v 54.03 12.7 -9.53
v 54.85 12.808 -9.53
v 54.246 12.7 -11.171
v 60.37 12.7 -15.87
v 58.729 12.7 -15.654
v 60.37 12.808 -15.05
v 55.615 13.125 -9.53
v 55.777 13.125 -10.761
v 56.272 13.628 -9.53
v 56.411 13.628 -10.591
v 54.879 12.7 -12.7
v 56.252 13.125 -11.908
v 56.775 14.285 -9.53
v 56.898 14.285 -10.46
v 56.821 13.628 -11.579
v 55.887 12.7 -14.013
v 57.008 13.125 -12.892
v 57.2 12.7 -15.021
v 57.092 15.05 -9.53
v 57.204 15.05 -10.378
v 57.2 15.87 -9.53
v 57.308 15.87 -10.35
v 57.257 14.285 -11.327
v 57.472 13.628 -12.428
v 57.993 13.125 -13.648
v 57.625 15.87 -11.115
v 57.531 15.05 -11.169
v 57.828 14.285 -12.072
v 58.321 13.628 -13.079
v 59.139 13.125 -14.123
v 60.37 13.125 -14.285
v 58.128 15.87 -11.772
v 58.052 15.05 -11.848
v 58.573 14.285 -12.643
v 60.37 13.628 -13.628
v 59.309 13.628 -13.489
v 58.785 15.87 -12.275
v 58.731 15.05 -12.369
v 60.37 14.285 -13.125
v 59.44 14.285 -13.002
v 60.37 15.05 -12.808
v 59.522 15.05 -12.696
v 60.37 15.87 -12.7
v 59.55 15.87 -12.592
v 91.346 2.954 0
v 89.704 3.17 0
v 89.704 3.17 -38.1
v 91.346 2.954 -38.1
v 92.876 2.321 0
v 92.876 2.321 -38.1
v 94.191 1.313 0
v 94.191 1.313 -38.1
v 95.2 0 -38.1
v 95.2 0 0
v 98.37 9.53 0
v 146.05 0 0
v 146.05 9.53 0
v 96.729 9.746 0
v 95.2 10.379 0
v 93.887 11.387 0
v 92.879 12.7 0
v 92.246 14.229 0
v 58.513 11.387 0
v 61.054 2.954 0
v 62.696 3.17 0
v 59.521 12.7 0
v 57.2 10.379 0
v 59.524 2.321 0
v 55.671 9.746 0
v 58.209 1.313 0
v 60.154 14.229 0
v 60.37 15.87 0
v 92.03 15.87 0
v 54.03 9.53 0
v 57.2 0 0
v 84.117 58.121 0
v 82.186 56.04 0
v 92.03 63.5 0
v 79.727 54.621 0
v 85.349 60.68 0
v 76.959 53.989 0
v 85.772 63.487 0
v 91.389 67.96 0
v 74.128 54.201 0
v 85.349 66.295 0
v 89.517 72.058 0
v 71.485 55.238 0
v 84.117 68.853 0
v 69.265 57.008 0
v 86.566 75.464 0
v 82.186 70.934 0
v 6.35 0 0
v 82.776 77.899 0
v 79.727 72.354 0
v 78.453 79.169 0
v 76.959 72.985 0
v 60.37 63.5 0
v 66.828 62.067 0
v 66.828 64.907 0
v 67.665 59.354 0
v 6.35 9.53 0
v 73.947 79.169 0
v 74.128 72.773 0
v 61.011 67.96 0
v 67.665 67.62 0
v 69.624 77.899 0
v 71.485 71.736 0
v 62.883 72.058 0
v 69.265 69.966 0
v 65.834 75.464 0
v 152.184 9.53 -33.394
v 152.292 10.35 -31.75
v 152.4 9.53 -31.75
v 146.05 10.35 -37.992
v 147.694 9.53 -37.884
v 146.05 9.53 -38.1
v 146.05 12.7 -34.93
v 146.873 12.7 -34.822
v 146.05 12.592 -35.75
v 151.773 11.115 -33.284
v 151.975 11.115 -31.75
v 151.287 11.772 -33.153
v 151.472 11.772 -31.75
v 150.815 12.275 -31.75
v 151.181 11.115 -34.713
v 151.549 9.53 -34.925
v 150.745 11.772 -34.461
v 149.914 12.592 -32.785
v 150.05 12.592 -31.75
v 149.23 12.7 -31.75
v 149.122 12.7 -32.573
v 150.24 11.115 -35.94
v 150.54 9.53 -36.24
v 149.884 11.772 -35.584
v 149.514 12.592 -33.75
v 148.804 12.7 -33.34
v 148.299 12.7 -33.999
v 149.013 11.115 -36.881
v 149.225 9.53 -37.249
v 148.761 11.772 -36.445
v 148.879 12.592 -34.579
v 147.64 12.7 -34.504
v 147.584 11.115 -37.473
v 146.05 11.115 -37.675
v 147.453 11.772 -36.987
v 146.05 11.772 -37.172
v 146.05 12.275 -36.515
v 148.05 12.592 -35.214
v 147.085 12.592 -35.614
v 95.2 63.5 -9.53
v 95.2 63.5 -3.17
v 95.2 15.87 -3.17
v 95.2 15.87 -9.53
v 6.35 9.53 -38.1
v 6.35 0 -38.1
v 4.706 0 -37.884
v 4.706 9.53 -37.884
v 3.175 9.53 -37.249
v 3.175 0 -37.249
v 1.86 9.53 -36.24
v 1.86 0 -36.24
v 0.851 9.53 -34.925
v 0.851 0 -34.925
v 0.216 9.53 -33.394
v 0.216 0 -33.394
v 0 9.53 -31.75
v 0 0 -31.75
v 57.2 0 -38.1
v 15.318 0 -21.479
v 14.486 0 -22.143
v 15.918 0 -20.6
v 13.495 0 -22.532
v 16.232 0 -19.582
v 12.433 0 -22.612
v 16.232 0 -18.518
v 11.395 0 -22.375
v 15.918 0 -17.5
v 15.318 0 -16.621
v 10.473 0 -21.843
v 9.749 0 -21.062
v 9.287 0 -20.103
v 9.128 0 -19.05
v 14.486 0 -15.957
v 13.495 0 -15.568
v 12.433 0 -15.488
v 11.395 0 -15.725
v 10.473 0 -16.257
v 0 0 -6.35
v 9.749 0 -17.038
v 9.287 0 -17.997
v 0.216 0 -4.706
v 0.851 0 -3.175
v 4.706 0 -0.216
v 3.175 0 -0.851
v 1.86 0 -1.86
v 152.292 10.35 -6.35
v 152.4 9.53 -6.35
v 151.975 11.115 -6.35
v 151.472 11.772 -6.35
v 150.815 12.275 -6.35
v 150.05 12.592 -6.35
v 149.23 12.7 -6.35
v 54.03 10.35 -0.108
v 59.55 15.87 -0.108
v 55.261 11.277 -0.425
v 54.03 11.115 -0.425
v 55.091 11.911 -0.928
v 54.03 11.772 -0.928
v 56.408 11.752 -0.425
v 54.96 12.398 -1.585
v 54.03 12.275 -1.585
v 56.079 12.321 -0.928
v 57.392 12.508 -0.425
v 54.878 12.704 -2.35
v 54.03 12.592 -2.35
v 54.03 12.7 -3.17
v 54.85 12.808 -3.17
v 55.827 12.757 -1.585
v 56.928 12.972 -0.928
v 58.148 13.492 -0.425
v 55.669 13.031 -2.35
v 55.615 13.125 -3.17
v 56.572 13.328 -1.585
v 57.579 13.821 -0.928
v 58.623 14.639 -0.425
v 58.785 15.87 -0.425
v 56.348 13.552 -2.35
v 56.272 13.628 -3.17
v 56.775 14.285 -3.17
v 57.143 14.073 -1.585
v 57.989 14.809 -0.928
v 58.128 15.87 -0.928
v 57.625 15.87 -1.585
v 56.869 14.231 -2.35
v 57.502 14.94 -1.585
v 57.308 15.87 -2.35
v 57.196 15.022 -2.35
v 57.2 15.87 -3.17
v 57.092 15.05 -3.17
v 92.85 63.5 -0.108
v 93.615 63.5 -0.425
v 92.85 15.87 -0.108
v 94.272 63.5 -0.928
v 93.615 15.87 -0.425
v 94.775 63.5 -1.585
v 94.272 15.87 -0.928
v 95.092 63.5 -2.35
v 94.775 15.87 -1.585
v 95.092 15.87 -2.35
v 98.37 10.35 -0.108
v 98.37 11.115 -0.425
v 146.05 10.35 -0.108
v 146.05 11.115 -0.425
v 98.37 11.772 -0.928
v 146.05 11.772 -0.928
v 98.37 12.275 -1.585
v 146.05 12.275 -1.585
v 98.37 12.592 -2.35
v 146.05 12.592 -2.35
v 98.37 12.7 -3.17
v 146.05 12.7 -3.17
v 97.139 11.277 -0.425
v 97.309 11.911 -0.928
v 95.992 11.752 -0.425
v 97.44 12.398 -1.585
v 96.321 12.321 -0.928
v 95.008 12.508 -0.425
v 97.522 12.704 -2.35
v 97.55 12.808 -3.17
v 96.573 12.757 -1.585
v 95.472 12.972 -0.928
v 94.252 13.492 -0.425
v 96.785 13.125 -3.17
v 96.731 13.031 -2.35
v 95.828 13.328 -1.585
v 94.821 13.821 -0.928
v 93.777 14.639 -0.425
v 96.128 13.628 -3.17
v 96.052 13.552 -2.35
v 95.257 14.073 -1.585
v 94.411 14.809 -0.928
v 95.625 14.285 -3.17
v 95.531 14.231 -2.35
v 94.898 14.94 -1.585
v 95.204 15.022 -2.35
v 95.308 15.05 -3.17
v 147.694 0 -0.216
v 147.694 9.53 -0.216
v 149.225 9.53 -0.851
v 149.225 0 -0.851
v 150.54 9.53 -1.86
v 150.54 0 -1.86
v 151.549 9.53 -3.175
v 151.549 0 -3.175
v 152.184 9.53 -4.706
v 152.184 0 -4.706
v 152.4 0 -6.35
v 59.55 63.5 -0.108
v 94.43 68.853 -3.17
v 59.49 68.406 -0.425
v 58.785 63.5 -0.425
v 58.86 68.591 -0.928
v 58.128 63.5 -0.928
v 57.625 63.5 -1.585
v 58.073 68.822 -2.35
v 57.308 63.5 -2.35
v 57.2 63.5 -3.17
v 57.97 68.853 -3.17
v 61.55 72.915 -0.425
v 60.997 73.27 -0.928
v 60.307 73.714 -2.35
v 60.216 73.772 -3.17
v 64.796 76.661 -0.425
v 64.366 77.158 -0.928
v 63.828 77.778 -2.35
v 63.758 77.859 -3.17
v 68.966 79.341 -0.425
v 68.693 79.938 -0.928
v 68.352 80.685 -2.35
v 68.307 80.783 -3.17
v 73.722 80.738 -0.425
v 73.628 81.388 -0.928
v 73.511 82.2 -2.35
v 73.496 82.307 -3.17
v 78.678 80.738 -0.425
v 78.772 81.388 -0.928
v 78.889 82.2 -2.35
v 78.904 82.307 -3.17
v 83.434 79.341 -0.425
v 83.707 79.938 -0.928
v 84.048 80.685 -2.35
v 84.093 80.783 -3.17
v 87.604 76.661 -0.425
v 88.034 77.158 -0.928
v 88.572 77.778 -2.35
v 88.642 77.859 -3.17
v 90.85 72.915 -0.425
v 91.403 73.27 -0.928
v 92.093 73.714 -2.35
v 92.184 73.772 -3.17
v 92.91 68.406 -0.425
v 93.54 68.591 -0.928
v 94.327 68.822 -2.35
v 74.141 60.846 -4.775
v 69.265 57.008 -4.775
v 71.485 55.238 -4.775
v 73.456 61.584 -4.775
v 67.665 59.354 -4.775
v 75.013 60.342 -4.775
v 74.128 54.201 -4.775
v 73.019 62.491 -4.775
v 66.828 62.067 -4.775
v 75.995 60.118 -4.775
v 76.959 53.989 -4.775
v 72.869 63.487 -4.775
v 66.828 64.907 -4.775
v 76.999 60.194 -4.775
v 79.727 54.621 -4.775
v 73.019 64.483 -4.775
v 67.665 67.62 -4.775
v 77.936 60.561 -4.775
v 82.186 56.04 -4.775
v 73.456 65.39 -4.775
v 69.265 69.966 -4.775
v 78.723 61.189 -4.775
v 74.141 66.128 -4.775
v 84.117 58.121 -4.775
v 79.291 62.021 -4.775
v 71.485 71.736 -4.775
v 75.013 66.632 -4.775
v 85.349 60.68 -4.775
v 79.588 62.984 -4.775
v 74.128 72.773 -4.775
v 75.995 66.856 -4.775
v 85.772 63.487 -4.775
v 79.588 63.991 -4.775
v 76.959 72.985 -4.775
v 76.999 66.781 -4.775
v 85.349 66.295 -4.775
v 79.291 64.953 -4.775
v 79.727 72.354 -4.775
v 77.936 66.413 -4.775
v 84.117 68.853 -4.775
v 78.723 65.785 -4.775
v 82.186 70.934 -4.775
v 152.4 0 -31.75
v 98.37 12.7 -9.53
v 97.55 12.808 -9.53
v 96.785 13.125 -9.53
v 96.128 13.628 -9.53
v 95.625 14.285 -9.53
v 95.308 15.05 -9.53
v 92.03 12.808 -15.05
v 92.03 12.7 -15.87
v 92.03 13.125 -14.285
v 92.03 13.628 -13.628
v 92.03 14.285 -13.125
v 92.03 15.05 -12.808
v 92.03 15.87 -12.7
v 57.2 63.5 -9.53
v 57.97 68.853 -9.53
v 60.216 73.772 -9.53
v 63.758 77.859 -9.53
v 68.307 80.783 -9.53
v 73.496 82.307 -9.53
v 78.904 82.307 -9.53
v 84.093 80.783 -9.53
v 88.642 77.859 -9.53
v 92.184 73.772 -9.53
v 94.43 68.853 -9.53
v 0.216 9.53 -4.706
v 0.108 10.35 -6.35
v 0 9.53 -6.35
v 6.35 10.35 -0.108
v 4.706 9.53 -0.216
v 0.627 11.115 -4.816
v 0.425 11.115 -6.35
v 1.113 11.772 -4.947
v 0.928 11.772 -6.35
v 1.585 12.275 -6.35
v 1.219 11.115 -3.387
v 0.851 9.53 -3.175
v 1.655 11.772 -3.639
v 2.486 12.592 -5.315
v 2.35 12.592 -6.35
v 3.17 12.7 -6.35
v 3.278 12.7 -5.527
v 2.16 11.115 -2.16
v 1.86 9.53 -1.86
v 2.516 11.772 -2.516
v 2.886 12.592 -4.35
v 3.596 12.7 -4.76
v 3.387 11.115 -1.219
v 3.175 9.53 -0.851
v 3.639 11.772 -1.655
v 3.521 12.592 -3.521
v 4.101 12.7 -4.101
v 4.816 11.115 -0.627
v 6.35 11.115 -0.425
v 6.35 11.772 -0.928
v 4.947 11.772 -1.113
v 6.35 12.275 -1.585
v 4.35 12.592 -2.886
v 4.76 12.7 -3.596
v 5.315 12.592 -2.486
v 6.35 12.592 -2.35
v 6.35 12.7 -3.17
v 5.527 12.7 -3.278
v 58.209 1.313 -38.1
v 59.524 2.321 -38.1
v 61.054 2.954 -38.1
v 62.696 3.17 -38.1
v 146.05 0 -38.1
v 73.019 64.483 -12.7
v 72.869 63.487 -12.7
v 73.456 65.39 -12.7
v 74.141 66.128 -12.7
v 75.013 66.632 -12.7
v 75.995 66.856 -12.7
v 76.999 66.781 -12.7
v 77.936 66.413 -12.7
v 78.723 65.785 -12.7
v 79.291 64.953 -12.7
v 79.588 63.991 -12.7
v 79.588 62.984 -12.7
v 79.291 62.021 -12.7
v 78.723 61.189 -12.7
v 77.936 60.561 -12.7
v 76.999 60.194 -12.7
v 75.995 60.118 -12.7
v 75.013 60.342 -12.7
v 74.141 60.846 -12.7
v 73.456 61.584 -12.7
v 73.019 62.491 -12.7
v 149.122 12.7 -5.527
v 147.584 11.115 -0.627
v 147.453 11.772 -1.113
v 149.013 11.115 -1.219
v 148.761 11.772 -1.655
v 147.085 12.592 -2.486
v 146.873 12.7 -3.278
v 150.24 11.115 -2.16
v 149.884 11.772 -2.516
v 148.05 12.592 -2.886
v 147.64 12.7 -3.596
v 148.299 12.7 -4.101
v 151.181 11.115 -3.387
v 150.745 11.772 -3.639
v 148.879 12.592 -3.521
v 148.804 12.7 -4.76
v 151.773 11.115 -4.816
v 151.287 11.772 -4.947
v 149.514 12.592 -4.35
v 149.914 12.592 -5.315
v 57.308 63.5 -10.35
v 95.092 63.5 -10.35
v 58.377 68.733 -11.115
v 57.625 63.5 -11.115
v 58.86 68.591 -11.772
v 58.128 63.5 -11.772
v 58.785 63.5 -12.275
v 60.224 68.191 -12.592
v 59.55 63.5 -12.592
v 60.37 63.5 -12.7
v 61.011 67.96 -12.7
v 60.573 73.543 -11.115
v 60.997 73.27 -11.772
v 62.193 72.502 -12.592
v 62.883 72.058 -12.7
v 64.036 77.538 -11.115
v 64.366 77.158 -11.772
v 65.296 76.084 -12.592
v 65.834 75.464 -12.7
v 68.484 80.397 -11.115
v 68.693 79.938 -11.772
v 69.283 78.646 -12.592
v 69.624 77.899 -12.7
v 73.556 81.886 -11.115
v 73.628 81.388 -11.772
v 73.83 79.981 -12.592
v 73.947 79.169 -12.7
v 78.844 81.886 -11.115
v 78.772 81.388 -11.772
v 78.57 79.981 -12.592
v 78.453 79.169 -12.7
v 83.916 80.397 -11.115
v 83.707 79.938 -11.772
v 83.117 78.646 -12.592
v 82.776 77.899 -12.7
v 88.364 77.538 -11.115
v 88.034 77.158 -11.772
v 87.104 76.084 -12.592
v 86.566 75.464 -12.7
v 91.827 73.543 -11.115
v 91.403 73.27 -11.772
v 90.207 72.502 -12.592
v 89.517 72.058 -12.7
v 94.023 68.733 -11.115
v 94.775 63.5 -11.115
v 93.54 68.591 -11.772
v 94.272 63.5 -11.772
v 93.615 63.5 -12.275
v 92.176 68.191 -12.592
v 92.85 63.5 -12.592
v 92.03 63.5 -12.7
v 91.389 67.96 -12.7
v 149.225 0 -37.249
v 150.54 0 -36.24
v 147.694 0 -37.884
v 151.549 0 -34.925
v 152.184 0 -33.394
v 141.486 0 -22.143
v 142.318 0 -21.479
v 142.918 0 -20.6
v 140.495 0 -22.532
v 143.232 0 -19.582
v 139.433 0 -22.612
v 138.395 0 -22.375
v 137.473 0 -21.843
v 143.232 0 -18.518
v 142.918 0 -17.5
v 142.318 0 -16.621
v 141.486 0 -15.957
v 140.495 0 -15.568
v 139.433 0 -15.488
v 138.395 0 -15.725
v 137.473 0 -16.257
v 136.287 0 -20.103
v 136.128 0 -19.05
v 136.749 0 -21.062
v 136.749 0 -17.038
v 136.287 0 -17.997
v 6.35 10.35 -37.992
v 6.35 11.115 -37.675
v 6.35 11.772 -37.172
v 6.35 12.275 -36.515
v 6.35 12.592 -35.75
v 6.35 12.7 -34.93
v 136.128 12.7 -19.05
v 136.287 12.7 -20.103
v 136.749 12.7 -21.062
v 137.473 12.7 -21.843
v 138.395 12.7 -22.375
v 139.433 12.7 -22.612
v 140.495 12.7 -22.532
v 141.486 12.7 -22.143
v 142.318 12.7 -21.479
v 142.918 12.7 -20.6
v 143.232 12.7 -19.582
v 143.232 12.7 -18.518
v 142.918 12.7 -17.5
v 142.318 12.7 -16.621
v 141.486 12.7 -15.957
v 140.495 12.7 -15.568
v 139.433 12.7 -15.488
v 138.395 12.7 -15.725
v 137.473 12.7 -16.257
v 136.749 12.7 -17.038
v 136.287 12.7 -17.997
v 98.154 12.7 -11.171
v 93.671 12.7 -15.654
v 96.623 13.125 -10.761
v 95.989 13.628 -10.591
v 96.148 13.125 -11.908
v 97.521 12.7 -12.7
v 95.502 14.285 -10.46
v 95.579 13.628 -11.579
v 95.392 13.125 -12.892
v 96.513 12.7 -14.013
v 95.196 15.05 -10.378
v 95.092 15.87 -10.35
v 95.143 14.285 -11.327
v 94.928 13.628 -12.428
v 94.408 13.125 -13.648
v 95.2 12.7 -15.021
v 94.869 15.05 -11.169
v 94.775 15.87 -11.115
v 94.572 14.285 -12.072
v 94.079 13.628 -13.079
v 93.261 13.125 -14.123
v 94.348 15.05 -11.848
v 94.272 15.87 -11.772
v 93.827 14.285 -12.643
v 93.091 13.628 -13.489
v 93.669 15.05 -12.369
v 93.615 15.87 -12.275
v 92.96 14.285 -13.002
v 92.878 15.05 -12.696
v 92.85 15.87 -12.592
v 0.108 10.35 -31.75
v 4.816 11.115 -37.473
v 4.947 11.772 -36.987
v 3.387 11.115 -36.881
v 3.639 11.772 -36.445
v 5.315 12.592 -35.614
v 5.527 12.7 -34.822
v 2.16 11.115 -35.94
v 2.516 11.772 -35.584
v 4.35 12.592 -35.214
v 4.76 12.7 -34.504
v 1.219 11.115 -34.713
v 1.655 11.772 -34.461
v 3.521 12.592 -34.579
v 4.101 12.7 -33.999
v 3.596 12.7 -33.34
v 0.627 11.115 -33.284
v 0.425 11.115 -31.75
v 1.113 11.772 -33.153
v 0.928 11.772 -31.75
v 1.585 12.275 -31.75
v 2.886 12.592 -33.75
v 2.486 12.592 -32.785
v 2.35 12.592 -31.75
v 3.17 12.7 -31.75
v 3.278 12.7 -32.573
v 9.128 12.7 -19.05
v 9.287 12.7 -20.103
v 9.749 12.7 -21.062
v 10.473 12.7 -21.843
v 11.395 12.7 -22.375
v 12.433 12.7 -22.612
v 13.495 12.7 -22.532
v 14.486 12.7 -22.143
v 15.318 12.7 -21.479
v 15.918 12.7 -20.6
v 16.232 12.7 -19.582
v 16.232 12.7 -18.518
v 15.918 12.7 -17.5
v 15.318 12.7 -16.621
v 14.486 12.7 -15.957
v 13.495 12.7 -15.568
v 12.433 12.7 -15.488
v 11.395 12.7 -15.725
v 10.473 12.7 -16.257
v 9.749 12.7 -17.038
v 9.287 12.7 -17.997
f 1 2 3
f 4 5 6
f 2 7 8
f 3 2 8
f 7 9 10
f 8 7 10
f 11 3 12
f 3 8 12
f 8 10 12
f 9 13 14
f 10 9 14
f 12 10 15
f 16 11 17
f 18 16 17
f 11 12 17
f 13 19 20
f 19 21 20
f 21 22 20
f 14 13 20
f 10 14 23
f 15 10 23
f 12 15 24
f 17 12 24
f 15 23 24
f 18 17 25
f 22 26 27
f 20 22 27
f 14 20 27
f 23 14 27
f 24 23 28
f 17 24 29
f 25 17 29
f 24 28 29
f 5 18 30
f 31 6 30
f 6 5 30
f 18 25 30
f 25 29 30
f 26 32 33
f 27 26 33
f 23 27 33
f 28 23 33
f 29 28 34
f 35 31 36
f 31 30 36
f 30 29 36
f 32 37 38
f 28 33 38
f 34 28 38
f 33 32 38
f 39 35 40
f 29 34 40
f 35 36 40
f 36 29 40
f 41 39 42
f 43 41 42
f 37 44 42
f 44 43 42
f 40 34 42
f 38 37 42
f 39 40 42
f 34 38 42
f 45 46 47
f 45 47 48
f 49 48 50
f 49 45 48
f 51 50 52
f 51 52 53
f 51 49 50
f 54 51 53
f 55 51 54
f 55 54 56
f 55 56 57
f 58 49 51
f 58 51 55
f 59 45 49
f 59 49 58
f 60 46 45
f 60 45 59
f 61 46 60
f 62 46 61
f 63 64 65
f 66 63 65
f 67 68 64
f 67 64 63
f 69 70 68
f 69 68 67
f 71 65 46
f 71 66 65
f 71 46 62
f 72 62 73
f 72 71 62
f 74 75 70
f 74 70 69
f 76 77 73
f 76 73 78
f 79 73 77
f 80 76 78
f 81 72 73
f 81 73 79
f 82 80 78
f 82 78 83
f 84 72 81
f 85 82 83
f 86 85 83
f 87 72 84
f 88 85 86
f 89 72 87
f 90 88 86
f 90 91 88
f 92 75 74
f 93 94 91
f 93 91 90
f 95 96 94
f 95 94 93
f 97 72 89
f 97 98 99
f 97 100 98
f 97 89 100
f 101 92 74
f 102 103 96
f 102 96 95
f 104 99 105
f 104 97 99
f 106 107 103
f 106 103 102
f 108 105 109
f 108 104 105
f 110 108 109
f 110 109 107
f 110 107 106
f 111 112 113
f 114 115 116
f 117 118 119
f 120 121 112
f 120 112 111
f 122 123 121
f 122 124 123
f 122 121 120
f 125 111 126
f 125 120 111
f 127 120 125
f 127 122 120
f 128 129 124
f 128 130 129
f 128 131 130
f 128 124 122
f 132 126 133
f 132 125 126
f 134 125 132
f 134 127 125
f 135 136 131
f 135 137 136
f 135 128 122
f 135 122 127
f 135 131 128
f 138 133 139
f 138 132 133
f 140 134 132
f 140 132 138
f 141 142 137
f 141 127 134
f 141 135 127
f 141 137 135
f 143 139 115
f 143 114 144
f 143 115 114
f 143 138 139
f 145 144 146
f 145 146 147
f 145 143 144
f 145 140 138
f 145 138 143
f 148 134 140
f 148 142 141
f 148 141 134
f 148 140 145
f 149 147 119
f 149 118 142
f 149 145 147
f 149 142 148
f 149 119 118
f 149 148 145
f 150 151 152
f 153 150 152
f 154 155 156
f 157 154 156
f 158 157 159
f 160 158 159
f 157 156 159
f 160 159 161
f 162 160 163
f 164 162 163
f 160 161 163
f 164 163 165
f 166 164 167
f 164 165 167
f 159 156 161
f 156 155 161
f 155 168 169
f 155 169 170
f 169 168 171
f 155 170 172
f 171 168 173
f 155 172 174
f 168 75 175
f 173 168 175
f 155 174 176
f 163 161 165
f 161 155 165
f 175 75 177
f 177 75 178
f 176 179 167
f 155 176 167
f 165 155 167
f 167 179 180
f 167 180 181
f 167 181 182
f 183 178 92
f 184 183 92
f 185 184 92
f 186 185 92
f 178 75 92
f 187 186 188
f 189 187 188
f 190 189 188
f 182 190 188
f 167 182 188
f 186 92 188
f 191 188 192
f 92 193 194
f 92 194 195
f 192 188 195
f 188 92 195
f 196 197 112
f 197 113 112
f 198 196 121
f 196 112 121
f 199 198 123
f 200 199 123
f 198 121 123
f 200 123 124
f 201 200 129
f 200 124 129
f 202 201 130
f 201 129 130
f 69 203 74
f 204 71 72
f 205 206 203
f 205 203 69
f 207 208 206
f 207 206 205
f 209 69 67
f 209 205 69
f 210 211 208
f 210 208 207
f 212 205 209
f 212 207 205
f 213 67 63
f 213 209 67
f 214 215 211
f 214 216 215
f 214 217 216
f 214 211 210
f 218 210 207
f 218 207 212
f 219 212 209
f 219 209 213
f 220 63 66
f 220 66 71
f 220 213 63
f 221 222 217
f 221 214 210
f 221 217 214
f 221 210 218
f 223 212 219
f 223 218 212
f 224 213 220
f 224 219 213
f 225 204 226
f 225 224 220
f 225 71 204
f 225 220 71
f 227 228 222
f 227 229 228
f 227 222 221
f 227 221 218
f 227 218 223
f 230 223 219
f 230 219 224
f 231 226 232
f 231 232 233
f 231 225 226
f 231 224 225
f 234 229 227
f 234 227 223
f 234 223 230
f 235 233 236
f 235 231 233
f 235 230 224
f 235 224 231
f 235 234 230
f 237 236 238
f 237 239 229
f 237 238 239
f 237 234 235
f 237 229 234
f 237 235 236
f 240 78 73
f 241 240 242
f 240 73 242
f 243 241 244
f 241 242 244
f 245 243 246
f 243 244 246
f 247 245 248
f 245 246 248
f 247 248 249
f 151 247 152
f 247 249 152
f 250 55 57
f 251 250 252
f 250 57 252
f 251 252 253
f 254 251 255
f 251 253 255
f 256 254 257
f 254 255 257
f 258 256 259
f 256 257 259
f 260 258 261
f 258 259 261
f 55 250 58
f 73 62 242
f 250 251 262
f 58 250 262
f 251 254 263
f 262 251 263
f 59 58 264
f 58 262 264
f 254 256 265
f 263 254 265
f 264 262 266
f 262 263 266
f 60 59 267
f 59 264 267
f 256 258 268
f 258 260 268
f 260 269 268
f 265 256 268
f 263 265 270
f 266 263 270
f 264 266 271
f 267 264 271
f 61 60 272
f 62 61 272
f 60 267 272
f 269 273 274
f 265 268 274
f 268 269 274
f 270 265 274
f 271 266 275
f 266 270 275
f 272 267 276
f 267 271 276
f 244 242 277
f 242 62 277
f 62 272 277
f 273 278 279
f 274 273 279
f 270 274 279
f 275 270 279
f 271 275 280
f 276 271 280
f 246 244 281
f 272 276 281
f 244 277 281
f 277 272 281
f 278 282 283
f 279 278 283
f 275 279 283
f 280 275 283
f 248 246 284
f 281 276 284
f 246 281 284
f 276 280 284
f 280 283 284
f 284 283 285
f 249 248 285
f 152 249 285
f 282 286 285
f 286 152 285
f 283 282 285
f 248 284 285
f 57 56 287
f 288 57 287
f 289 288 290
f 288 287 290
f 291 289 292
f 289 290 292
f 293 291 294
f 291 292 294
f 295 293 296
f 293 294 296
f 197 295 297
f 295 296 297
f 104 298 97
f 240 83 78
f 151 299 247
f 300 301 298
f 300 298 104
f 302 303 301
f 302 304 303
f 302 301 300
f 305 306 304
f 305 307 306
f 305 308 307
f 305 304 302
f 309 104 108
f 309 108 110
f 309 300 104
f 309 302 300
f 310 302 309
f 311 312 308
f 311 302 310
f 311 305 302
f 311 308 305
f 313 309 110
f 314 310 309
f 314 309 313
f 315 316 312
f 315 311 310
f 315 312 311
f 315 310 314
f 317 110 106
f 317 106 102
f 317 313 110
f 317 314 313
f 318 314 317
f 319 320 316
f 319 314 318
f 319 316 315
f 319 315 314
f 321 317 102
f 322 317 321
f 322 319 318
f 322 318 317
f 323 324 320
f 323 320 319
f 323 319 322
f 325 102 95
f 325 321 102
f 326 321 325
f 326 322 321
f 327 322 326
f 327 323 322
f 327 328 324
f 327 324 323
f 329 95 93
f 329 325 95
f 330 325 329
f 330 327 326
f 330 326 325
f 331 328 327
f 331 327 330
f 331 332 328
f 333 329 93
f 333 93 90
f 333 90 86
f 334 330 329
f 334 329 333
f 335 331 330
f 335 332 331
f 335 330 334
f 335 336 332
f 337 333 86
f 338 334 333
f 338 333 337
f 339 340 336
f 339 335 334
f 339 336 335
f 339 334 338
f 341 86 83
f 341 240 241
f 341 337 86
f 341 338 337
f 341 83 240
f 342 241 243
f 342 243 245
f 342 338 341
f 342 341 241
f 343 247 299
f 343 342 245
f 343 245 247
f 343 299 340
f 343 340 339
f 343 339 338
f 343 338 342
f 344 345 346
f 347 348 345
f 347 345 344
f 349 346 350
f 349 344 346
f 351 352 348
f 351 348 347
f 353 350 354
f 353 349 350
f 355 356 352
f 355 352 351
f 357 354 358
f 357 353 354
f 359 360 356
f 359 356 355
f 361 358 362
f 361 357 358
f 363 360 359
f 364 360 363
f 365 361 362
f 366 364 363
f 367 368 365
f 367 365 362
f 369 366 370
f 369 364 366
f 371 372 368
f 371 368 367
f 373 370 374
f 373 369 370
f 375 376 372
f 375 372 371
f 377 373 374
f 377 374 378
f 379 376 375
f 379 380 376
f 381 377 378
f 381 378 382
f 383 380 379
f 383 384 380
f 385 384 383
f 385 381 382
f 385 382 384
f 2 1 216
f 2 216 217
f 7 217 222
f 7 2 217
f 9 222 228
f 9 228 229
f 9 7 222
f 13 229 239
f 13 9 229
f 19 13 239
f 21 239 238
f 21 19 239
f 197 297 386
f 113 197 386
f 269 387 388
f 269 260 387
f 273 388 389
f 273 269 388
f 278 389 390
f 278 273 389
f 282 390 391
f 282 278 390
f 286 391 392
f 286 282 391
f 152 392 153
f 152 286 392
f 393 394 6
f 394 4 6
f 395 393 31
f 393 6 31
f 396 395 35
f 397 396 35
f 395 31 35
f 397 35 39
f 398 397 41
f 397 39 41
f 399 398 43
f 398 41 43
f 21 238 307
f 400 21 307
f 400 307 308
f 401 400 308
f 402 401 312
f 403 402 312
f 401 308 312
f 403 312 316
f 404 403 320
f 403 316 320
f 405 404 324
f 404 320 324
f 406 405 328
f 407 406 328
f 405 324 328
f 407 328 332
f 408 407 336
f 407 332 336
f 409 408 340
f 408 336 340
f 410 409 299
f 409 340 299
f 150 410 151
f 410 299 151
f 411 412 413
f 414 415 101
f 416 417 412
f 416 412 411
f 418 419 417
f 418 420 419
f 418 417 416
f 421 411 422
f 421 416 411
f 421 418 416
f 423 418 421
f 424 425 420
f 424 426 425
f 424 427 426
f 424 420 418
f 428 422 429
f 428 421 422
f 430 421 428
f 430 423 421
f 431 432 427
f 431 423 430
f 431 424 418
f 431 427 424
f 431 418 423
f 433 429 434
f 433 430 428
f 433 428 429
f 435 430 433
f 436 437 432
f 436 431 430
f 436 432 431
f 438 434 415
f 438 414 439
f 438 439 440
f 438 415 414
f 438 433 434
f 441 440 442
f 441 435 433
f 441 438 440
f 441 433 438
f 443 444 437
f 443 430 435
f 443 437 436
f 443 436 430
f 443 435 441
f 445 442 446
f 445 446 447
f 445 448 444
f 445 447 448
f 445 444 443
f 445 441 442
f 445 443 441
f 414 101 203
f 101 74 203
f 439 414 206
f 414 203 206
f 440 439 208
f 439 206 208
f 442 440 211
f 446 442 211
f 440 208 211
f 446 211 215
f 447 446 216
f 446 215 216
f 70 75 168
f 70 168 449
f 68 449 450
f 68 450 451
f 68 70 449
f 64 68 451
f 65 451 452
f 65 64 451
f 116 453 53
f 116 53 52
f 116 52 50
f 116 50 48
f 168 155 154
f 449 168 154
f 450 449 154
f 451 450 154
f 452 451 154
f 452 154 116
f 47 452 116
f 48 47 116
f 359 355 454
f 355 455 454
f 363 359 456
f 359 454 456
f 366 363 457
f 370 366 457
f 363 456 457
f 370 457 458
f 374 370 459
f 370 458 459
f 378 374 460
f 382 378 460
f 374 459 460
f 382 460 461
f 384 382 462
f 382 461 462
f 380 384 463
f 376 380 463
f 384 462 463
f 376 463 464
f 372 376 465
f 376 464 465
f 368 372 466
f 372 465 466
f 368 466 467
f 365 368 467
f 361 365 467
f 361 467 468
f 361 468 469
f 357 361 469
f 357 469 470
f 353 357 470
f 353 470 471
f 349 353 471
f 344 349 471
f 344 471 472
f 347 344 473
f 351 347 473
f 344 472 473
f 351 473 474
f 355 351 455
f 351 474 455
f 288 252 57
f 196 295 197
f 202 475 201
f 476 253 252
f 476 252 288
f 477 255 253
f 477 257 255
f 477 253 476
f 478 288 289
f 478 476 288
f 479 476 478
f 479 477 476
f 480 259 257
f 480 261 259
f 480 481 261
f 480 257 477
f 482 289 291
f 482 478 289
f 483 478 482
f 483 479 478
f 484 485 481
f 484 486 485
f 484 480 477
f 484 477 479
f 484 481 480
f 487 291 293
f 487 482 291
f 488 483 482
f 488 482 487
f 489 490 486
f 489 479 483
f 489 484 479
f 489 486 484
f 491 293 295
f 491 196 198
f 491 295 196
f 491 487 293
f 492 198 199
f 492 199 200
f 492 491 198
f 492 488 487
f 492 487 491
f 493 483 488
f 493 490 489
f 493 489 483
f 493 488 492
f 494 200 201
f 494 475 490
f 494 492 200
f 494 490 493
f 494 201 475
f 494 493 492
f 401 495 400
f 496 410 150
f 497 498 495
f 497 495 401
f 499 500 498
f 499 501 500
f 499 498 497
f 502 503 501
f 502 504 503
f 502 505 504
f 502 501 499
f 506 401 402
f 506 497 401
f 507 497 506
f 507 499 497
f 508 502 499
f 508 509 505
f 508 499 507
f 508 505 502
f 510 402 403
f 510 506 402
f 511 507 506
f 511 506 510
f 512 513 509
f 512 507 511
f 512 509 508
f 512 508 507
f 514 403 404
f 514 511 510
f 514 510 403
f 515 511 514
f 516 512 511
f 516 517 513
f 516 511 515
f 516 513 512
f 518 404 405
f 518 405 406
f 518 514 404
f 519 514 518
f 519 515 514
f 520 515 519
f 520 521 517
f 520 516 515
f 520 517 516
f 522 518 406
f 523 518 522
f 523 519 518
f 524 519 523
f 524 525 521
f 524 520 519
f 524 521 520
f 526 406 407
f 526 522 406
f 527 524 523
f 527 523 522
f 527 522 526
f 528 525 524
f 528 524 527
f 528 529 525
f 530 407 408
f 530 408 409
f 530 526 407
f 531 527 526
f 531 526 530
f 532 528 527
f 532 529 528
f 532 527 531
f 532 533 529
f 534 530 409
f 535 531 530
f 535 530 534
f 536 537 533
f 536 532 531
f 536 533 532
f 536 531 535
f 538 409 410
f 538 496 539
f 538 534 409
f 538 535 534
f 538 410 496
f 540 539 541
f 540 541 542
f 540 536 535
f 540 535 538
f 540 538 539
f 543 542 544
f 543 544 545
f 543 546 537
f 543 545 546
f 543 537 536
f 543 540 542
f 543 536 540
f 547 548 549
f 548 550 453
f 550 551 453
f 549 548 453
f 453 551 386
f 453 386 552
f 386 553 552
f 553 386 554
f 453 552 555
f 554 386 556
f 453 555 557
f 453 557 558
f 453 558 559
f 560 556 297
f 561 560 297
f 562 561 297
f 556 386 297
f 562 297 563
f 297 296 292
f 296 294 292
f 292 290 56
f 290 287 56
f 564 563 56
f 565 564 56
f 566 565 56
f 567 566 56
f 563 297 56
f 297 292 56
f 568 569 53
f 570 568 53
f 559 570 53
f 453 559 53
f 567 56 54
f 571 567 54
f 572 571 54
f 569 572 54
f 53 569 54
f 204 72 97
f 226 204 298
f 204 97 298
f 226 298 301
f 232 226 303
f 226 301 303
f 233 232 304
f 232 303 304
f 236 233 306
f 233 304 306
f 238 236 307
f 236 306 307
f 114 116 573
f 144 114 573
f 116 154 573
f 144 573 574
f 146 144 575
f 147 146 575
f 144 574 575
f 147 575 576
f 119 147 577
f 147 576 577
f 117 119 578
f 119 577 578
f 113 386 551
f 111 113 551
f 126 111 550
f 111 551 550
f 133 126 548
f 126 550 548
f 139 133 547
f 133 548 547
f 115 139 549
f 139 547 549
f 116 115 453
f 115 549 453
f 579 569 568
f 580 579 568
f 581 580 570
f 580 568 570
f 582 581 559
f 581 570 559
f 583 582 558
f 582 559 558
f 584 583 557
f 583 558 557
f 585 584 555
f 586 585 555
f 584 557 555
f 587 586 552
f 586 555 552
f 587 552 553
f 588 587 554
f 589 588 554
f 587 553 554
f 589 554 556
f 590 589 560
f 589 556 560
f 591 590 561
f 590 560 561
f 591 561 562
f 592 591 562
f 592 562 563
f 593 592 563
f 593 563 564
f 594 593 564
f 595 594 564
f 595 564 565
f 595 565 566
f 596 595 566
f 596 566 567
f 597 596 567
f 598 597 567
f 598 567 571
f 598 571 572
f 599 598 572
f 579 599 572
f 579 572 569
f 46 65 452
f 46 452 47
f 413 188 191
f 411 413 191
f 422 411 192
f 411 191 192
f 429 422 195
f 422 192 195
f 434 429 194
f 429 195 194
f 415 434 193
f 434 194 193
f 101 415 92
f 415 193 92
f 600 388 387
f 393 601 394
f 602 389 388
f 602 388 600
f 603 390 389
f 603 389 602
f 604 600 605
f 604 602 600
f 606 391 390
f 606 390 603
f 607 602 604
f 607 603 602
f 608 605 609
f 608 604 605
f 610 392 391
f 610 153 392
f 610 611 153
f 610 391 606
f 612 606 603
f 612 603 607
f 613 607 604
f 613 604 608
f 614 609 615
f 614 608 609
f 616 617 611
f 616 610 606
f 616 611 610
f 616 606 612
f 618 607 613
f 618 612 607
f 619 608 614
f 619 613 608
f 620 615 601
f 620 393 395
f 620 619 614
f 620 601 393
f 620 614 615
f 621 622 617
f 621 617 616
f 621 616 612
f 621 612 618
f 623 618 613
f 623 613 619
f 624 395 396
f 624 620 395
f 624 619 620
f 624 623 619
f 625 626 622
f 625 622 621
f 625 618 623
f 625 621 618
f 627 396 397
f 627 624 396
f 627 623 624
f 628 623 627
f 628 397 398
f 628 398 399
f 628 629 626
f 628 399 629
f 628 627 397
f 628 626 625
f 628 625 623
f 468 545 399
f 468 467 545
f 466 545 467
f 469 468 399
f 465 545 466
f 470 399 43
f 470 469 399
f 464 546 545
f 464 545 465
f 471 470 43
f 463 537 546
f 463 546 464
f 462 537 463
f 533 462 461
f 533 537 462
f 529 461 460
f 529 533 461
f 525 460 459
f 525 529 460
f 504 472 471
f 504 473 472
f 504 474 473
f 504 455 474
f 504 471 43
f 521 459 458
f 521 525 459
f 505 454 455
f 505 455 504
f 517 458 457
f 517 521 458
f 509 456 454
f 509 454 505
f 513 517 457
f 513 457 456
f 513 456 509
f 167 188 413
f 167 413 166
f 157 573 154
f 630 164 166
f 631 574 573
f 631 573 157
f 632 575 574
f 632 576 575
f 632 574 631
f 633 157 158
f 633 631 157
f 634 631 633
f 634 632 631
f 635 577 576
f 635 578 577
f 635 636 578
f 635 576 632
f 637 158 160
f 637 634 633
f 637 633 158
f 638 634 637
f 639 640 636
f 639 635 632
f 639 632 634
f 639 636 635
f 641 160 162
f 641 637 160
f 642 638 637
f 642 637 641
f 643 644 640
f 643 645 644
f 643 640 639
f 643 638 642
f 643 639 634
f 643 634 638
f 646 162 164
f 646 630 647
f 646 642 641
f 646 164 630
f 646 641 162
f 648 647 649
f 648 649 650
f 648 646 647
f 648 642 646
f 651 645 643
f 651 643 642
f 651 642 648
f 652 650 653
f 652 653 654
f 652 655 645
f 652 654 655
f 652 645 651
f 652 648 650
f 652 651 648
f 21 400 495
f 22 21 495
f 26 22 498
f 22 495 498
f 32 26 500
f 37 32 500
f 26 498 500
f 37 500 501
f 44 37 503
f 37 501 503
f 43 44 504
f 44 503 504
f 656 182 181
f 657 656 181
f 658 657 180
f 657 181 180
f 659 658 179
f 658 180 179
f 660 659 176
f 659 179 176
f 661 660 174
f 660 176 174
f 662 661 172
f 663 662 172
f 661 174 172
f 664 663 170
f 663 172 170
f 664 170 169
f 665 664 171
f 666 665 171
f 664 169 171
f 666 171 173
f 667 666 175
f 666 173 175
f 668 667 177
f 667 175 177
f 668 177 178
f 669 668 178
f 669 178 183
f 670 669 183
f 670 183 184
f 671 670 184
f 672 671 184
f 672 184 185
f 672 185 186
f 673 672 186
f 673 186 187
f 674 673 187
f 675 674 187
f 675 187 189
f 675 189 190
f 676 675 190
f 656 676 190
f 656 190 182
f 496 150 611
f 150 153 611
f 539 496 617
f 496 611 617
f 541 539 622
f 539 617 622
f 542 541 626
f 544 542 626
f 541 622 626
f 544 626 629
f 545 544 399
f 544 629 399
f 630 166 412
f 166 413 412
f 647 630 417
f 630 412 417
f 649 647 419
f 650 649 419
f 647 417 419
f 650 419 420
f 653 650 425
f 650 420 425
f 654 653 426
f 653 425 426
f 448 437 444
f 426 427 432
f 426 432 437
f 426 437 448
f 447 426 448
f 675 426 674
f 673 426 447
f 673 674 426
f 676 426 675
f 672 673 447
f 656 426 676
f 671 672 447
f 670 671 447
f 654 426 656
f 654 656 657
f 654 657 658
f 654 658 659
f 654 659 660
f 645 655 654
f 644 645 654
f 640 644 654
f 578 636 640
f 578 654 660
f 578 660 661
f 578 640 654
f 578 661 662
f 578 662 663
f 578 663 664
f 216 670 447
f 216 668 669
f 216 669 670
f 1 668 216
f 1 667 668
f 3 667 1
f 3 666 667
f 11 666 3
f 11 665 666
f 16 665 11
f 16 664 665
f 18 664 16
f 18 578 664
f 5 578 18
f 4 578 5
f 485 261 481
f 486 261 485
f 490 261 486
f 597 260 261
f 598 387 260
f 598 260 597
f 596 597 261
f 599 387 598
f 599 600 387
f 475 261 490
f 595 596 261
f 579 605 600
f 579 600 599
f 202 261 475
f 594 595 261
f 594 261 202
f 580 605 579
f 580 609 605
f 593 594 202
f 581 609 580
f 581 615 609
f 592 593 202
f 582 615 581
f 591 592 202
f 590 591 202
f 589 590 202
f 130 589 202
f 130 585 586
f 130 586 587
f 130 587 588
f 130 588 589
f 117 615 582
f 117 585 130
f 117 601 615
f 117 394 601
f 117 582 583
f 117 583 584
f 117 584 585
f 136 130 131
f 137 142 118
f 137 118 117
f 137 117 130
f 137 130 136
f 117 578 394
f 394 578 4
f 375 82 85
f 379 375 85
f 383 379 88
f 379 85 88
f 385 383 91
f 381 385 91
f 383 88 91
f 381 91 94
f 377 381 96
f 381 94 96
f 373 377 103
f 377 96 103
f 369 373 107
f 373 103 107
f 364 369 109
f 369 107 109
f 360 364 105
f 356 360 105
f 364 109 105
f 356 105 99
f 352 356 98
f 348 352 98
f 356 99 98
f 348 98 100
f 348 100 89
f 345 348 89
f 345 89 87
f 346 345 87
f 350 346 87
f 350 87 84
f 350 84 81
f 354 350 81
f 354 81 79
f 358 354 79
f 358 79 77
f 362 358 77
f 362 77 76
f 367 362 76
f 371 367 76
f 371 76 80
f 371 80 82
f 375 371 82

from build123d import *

# Parameters (mm, degrees)
SKETCH1_W                                = 152.4
SKETCH1_H                                = 38.1
BASEPLATE_DEPTH                          = 12.7
VERTBOSS_DEPTH                           = 12.7
F_9_32_0_28125_DIAMETER_HOLE1_D          = 7.14375
CBORE_FOR_1_4_HEX_HEAD_BOLT1_D           = 6.7564
CBORE_FOR_1_4_HEX_HEAD_BOLT1_CBORE_D     = 19.05
CBORE_FOR_1_4_HEX_HEAD_BOLT1_CBORE_DEPTH = 4.7752
SKETCH11_W                               = 38
SKETCH11_H                               = 3.17
BOTTOMSLOT_DEPTH                         = 178.43624207
FILLET1_R                                = 6.35
FILLET2_R                                = 3.17


with BuildPart() as part:
    # Sketch1 → BasePlate (new body)
    with BuildSketch(Plane(origin=(0, 0, 0), x_dir=(1, 0, 0), z_dir=(0, 1, 0))):
        with Locations((76.2, 19.05)):
            Rectangle(SKETCH1_W, SKETCH1_H)
    extrude(amount=BASEPLATE_DEPTH)

    # Sketch3 → VertBoss (add)
    with BuildSketch(Plane.XY):
        with BuildLine():
            Line((57.2, 0), (57.2, 63.5))
            ThreePointArc((57.2, 63.5), (76.2, 82.5), (95.2, 63.5))
            Line((95.2, 63.5), (95.2, 0))
            Line((95.2, 0), (57.2, 0))
        make_face()
    extrude(amount=-VERTBOSS_DEPTH)

    # 9/32 (0.28125) Diameter Hole1 (through all)
    with Locations(Plane(origin=(0, 12.7, 0), x_dir=(1, 0, 0), z_dir=(0, 1, 0))):
        with Locations((139.7, 19.05), (12.7, 19.05)):
            Hole(F_9_32_0_28125_DIAMETER_HOLE1_D / 2)

    # CBORE for 1/4 Hex Head Bolt1 (through all)
    with Locations(Plane.XY):
        with Locations((76.24706856, 63.487087048)):
            CounterBoreHole(CBORE_FOR_1_4_HEX_HEAD_BOLT1_D / 2, CBORE_FOR_1_4_HEX_HEAD_BOLT1_CBORE_D / 2, CBORE_FOR_1_4_HEX_HEAD_BOLT1_CBORE_DEPTH)

    # Sketch11 → BottomSlot (cut, through all)
    with BuildSketch(Plane.XY):
        with Locations((76.2, 1.585)):
            Rectangle(SKETCH11_W, SKETCH11_H)
    extrude(amount=-BOTTOMSLOT_DEPTH, mode=Mode.SUBTRACT)

    # Fillet1
    # the kernel refuses this fillet: 6.35 mm, written as the material it adds along each edge
    with BuildSketch(Plane(origin=(95.2, 3.17, 0), x_dir=(-1, 0, 0), z_dir=(0, 0, -1))) as fillet1_piece_1:
        with BuildLine():
            CenterArc((5.49637153, -6.35), FILLET1_R, 90, 59.947892244)
            Line((0, -3.17), (0, 0))
            Line((0, 0), (5.49637153, 0))
        make_face()
    extrude(amount=38.1)
    with BuildSketch(Plane(origin=(57.2, 3.17, 0), x_dir=(0, -1, 0), z_dir=(0, 0, -1))) as fillet1_piece_2:
        with BuildLine():
            CenterArc((6.35, -5.49637153), FILLET1_R, 120.052107756, 59.947892244)
            Line((0, -5.49637153), (0, 0))
            Line((0, 0), (3.17, 0))
        make_face()
    extrude(amount=38.1)
    # the kernel refuses this fillet: 6.35 mm, written as the material it takes off along each edge
    with BuildSketch(Plane(origin=(0, -15.875, -38.1), x_dir=(0, 0, 1), z_dir=(0, 1, 0)), Plane(origin=(0, -15.875, 0), x_dir=(1, 0, 0), z_dir=(0, 1, 0))) as fillet1_2_piece_1:
        with BuildLine():
            CenterArc((FILLET1_R, FILLET1_R), FILLET1_R, 180, 90)
            Line((0, FILLET1_R), (0, 0))
            Line((0, 0), (FILLET1_R, 0))
        make_face()
    extrude(amount=44.45, mode=Mode.SUBTRACT)
    with BuildSketch(Plane(origin=(152.4, -15.875, -38.1), x_dir=(0, 0, 1), z_dir=(0, 1, 0)), Plane(origin=(152.4, -15.875, 0), x_dir=(-1, 0, 0), z_dir=(0, 1, 0))) as fillet1_2_piece_2:
        with BuildLine():
            CenterArc((FILLET1_R, -FILLET1_R), FILLET1_R, 90, 90)
            Line((0, -FILLET1_R), (0, 0))
            Line((0, 0), (FILLET1_R, 0))
        make_face()
    extrude(amount=44.45, mode=Mode.SUBTRACT)

    # Fillet2
    fillet2_edges = [part.edges().sort_by_distance(p)[0] for p in [
        (120.625, 12.7, 0),
        (57.2, 38.1, -12.7),
        (95.2, 38.1, -12.7),
        (57.2, 38.1, 0),
        (95.2, 38.1, 0),
        (76.2, 82.5, 0),
        (57.2, 12.7, -6.35),
        (76.2, 82.5, -12.7),
        (95.2, 12.7, -6.35),
        (76.2, 12.7, -12.7),
        (0, 12.7, -19.05),
        (76.2, 12.7, -38.1),
        (31.775, 12.7, 0),
        (152.4, 12.7, -19.05),
        (150.540128061, 12.7, -1.859871939),
        (150.540128061, 12.7, -36.240128061),
        (1.859871939, 12.7, -1.859871939),
        (1.859871939, 12.7, -36.240128061),
    ]]
    fillet(fillet2_edges, radius=FILLET2_R)


solid = part.part
